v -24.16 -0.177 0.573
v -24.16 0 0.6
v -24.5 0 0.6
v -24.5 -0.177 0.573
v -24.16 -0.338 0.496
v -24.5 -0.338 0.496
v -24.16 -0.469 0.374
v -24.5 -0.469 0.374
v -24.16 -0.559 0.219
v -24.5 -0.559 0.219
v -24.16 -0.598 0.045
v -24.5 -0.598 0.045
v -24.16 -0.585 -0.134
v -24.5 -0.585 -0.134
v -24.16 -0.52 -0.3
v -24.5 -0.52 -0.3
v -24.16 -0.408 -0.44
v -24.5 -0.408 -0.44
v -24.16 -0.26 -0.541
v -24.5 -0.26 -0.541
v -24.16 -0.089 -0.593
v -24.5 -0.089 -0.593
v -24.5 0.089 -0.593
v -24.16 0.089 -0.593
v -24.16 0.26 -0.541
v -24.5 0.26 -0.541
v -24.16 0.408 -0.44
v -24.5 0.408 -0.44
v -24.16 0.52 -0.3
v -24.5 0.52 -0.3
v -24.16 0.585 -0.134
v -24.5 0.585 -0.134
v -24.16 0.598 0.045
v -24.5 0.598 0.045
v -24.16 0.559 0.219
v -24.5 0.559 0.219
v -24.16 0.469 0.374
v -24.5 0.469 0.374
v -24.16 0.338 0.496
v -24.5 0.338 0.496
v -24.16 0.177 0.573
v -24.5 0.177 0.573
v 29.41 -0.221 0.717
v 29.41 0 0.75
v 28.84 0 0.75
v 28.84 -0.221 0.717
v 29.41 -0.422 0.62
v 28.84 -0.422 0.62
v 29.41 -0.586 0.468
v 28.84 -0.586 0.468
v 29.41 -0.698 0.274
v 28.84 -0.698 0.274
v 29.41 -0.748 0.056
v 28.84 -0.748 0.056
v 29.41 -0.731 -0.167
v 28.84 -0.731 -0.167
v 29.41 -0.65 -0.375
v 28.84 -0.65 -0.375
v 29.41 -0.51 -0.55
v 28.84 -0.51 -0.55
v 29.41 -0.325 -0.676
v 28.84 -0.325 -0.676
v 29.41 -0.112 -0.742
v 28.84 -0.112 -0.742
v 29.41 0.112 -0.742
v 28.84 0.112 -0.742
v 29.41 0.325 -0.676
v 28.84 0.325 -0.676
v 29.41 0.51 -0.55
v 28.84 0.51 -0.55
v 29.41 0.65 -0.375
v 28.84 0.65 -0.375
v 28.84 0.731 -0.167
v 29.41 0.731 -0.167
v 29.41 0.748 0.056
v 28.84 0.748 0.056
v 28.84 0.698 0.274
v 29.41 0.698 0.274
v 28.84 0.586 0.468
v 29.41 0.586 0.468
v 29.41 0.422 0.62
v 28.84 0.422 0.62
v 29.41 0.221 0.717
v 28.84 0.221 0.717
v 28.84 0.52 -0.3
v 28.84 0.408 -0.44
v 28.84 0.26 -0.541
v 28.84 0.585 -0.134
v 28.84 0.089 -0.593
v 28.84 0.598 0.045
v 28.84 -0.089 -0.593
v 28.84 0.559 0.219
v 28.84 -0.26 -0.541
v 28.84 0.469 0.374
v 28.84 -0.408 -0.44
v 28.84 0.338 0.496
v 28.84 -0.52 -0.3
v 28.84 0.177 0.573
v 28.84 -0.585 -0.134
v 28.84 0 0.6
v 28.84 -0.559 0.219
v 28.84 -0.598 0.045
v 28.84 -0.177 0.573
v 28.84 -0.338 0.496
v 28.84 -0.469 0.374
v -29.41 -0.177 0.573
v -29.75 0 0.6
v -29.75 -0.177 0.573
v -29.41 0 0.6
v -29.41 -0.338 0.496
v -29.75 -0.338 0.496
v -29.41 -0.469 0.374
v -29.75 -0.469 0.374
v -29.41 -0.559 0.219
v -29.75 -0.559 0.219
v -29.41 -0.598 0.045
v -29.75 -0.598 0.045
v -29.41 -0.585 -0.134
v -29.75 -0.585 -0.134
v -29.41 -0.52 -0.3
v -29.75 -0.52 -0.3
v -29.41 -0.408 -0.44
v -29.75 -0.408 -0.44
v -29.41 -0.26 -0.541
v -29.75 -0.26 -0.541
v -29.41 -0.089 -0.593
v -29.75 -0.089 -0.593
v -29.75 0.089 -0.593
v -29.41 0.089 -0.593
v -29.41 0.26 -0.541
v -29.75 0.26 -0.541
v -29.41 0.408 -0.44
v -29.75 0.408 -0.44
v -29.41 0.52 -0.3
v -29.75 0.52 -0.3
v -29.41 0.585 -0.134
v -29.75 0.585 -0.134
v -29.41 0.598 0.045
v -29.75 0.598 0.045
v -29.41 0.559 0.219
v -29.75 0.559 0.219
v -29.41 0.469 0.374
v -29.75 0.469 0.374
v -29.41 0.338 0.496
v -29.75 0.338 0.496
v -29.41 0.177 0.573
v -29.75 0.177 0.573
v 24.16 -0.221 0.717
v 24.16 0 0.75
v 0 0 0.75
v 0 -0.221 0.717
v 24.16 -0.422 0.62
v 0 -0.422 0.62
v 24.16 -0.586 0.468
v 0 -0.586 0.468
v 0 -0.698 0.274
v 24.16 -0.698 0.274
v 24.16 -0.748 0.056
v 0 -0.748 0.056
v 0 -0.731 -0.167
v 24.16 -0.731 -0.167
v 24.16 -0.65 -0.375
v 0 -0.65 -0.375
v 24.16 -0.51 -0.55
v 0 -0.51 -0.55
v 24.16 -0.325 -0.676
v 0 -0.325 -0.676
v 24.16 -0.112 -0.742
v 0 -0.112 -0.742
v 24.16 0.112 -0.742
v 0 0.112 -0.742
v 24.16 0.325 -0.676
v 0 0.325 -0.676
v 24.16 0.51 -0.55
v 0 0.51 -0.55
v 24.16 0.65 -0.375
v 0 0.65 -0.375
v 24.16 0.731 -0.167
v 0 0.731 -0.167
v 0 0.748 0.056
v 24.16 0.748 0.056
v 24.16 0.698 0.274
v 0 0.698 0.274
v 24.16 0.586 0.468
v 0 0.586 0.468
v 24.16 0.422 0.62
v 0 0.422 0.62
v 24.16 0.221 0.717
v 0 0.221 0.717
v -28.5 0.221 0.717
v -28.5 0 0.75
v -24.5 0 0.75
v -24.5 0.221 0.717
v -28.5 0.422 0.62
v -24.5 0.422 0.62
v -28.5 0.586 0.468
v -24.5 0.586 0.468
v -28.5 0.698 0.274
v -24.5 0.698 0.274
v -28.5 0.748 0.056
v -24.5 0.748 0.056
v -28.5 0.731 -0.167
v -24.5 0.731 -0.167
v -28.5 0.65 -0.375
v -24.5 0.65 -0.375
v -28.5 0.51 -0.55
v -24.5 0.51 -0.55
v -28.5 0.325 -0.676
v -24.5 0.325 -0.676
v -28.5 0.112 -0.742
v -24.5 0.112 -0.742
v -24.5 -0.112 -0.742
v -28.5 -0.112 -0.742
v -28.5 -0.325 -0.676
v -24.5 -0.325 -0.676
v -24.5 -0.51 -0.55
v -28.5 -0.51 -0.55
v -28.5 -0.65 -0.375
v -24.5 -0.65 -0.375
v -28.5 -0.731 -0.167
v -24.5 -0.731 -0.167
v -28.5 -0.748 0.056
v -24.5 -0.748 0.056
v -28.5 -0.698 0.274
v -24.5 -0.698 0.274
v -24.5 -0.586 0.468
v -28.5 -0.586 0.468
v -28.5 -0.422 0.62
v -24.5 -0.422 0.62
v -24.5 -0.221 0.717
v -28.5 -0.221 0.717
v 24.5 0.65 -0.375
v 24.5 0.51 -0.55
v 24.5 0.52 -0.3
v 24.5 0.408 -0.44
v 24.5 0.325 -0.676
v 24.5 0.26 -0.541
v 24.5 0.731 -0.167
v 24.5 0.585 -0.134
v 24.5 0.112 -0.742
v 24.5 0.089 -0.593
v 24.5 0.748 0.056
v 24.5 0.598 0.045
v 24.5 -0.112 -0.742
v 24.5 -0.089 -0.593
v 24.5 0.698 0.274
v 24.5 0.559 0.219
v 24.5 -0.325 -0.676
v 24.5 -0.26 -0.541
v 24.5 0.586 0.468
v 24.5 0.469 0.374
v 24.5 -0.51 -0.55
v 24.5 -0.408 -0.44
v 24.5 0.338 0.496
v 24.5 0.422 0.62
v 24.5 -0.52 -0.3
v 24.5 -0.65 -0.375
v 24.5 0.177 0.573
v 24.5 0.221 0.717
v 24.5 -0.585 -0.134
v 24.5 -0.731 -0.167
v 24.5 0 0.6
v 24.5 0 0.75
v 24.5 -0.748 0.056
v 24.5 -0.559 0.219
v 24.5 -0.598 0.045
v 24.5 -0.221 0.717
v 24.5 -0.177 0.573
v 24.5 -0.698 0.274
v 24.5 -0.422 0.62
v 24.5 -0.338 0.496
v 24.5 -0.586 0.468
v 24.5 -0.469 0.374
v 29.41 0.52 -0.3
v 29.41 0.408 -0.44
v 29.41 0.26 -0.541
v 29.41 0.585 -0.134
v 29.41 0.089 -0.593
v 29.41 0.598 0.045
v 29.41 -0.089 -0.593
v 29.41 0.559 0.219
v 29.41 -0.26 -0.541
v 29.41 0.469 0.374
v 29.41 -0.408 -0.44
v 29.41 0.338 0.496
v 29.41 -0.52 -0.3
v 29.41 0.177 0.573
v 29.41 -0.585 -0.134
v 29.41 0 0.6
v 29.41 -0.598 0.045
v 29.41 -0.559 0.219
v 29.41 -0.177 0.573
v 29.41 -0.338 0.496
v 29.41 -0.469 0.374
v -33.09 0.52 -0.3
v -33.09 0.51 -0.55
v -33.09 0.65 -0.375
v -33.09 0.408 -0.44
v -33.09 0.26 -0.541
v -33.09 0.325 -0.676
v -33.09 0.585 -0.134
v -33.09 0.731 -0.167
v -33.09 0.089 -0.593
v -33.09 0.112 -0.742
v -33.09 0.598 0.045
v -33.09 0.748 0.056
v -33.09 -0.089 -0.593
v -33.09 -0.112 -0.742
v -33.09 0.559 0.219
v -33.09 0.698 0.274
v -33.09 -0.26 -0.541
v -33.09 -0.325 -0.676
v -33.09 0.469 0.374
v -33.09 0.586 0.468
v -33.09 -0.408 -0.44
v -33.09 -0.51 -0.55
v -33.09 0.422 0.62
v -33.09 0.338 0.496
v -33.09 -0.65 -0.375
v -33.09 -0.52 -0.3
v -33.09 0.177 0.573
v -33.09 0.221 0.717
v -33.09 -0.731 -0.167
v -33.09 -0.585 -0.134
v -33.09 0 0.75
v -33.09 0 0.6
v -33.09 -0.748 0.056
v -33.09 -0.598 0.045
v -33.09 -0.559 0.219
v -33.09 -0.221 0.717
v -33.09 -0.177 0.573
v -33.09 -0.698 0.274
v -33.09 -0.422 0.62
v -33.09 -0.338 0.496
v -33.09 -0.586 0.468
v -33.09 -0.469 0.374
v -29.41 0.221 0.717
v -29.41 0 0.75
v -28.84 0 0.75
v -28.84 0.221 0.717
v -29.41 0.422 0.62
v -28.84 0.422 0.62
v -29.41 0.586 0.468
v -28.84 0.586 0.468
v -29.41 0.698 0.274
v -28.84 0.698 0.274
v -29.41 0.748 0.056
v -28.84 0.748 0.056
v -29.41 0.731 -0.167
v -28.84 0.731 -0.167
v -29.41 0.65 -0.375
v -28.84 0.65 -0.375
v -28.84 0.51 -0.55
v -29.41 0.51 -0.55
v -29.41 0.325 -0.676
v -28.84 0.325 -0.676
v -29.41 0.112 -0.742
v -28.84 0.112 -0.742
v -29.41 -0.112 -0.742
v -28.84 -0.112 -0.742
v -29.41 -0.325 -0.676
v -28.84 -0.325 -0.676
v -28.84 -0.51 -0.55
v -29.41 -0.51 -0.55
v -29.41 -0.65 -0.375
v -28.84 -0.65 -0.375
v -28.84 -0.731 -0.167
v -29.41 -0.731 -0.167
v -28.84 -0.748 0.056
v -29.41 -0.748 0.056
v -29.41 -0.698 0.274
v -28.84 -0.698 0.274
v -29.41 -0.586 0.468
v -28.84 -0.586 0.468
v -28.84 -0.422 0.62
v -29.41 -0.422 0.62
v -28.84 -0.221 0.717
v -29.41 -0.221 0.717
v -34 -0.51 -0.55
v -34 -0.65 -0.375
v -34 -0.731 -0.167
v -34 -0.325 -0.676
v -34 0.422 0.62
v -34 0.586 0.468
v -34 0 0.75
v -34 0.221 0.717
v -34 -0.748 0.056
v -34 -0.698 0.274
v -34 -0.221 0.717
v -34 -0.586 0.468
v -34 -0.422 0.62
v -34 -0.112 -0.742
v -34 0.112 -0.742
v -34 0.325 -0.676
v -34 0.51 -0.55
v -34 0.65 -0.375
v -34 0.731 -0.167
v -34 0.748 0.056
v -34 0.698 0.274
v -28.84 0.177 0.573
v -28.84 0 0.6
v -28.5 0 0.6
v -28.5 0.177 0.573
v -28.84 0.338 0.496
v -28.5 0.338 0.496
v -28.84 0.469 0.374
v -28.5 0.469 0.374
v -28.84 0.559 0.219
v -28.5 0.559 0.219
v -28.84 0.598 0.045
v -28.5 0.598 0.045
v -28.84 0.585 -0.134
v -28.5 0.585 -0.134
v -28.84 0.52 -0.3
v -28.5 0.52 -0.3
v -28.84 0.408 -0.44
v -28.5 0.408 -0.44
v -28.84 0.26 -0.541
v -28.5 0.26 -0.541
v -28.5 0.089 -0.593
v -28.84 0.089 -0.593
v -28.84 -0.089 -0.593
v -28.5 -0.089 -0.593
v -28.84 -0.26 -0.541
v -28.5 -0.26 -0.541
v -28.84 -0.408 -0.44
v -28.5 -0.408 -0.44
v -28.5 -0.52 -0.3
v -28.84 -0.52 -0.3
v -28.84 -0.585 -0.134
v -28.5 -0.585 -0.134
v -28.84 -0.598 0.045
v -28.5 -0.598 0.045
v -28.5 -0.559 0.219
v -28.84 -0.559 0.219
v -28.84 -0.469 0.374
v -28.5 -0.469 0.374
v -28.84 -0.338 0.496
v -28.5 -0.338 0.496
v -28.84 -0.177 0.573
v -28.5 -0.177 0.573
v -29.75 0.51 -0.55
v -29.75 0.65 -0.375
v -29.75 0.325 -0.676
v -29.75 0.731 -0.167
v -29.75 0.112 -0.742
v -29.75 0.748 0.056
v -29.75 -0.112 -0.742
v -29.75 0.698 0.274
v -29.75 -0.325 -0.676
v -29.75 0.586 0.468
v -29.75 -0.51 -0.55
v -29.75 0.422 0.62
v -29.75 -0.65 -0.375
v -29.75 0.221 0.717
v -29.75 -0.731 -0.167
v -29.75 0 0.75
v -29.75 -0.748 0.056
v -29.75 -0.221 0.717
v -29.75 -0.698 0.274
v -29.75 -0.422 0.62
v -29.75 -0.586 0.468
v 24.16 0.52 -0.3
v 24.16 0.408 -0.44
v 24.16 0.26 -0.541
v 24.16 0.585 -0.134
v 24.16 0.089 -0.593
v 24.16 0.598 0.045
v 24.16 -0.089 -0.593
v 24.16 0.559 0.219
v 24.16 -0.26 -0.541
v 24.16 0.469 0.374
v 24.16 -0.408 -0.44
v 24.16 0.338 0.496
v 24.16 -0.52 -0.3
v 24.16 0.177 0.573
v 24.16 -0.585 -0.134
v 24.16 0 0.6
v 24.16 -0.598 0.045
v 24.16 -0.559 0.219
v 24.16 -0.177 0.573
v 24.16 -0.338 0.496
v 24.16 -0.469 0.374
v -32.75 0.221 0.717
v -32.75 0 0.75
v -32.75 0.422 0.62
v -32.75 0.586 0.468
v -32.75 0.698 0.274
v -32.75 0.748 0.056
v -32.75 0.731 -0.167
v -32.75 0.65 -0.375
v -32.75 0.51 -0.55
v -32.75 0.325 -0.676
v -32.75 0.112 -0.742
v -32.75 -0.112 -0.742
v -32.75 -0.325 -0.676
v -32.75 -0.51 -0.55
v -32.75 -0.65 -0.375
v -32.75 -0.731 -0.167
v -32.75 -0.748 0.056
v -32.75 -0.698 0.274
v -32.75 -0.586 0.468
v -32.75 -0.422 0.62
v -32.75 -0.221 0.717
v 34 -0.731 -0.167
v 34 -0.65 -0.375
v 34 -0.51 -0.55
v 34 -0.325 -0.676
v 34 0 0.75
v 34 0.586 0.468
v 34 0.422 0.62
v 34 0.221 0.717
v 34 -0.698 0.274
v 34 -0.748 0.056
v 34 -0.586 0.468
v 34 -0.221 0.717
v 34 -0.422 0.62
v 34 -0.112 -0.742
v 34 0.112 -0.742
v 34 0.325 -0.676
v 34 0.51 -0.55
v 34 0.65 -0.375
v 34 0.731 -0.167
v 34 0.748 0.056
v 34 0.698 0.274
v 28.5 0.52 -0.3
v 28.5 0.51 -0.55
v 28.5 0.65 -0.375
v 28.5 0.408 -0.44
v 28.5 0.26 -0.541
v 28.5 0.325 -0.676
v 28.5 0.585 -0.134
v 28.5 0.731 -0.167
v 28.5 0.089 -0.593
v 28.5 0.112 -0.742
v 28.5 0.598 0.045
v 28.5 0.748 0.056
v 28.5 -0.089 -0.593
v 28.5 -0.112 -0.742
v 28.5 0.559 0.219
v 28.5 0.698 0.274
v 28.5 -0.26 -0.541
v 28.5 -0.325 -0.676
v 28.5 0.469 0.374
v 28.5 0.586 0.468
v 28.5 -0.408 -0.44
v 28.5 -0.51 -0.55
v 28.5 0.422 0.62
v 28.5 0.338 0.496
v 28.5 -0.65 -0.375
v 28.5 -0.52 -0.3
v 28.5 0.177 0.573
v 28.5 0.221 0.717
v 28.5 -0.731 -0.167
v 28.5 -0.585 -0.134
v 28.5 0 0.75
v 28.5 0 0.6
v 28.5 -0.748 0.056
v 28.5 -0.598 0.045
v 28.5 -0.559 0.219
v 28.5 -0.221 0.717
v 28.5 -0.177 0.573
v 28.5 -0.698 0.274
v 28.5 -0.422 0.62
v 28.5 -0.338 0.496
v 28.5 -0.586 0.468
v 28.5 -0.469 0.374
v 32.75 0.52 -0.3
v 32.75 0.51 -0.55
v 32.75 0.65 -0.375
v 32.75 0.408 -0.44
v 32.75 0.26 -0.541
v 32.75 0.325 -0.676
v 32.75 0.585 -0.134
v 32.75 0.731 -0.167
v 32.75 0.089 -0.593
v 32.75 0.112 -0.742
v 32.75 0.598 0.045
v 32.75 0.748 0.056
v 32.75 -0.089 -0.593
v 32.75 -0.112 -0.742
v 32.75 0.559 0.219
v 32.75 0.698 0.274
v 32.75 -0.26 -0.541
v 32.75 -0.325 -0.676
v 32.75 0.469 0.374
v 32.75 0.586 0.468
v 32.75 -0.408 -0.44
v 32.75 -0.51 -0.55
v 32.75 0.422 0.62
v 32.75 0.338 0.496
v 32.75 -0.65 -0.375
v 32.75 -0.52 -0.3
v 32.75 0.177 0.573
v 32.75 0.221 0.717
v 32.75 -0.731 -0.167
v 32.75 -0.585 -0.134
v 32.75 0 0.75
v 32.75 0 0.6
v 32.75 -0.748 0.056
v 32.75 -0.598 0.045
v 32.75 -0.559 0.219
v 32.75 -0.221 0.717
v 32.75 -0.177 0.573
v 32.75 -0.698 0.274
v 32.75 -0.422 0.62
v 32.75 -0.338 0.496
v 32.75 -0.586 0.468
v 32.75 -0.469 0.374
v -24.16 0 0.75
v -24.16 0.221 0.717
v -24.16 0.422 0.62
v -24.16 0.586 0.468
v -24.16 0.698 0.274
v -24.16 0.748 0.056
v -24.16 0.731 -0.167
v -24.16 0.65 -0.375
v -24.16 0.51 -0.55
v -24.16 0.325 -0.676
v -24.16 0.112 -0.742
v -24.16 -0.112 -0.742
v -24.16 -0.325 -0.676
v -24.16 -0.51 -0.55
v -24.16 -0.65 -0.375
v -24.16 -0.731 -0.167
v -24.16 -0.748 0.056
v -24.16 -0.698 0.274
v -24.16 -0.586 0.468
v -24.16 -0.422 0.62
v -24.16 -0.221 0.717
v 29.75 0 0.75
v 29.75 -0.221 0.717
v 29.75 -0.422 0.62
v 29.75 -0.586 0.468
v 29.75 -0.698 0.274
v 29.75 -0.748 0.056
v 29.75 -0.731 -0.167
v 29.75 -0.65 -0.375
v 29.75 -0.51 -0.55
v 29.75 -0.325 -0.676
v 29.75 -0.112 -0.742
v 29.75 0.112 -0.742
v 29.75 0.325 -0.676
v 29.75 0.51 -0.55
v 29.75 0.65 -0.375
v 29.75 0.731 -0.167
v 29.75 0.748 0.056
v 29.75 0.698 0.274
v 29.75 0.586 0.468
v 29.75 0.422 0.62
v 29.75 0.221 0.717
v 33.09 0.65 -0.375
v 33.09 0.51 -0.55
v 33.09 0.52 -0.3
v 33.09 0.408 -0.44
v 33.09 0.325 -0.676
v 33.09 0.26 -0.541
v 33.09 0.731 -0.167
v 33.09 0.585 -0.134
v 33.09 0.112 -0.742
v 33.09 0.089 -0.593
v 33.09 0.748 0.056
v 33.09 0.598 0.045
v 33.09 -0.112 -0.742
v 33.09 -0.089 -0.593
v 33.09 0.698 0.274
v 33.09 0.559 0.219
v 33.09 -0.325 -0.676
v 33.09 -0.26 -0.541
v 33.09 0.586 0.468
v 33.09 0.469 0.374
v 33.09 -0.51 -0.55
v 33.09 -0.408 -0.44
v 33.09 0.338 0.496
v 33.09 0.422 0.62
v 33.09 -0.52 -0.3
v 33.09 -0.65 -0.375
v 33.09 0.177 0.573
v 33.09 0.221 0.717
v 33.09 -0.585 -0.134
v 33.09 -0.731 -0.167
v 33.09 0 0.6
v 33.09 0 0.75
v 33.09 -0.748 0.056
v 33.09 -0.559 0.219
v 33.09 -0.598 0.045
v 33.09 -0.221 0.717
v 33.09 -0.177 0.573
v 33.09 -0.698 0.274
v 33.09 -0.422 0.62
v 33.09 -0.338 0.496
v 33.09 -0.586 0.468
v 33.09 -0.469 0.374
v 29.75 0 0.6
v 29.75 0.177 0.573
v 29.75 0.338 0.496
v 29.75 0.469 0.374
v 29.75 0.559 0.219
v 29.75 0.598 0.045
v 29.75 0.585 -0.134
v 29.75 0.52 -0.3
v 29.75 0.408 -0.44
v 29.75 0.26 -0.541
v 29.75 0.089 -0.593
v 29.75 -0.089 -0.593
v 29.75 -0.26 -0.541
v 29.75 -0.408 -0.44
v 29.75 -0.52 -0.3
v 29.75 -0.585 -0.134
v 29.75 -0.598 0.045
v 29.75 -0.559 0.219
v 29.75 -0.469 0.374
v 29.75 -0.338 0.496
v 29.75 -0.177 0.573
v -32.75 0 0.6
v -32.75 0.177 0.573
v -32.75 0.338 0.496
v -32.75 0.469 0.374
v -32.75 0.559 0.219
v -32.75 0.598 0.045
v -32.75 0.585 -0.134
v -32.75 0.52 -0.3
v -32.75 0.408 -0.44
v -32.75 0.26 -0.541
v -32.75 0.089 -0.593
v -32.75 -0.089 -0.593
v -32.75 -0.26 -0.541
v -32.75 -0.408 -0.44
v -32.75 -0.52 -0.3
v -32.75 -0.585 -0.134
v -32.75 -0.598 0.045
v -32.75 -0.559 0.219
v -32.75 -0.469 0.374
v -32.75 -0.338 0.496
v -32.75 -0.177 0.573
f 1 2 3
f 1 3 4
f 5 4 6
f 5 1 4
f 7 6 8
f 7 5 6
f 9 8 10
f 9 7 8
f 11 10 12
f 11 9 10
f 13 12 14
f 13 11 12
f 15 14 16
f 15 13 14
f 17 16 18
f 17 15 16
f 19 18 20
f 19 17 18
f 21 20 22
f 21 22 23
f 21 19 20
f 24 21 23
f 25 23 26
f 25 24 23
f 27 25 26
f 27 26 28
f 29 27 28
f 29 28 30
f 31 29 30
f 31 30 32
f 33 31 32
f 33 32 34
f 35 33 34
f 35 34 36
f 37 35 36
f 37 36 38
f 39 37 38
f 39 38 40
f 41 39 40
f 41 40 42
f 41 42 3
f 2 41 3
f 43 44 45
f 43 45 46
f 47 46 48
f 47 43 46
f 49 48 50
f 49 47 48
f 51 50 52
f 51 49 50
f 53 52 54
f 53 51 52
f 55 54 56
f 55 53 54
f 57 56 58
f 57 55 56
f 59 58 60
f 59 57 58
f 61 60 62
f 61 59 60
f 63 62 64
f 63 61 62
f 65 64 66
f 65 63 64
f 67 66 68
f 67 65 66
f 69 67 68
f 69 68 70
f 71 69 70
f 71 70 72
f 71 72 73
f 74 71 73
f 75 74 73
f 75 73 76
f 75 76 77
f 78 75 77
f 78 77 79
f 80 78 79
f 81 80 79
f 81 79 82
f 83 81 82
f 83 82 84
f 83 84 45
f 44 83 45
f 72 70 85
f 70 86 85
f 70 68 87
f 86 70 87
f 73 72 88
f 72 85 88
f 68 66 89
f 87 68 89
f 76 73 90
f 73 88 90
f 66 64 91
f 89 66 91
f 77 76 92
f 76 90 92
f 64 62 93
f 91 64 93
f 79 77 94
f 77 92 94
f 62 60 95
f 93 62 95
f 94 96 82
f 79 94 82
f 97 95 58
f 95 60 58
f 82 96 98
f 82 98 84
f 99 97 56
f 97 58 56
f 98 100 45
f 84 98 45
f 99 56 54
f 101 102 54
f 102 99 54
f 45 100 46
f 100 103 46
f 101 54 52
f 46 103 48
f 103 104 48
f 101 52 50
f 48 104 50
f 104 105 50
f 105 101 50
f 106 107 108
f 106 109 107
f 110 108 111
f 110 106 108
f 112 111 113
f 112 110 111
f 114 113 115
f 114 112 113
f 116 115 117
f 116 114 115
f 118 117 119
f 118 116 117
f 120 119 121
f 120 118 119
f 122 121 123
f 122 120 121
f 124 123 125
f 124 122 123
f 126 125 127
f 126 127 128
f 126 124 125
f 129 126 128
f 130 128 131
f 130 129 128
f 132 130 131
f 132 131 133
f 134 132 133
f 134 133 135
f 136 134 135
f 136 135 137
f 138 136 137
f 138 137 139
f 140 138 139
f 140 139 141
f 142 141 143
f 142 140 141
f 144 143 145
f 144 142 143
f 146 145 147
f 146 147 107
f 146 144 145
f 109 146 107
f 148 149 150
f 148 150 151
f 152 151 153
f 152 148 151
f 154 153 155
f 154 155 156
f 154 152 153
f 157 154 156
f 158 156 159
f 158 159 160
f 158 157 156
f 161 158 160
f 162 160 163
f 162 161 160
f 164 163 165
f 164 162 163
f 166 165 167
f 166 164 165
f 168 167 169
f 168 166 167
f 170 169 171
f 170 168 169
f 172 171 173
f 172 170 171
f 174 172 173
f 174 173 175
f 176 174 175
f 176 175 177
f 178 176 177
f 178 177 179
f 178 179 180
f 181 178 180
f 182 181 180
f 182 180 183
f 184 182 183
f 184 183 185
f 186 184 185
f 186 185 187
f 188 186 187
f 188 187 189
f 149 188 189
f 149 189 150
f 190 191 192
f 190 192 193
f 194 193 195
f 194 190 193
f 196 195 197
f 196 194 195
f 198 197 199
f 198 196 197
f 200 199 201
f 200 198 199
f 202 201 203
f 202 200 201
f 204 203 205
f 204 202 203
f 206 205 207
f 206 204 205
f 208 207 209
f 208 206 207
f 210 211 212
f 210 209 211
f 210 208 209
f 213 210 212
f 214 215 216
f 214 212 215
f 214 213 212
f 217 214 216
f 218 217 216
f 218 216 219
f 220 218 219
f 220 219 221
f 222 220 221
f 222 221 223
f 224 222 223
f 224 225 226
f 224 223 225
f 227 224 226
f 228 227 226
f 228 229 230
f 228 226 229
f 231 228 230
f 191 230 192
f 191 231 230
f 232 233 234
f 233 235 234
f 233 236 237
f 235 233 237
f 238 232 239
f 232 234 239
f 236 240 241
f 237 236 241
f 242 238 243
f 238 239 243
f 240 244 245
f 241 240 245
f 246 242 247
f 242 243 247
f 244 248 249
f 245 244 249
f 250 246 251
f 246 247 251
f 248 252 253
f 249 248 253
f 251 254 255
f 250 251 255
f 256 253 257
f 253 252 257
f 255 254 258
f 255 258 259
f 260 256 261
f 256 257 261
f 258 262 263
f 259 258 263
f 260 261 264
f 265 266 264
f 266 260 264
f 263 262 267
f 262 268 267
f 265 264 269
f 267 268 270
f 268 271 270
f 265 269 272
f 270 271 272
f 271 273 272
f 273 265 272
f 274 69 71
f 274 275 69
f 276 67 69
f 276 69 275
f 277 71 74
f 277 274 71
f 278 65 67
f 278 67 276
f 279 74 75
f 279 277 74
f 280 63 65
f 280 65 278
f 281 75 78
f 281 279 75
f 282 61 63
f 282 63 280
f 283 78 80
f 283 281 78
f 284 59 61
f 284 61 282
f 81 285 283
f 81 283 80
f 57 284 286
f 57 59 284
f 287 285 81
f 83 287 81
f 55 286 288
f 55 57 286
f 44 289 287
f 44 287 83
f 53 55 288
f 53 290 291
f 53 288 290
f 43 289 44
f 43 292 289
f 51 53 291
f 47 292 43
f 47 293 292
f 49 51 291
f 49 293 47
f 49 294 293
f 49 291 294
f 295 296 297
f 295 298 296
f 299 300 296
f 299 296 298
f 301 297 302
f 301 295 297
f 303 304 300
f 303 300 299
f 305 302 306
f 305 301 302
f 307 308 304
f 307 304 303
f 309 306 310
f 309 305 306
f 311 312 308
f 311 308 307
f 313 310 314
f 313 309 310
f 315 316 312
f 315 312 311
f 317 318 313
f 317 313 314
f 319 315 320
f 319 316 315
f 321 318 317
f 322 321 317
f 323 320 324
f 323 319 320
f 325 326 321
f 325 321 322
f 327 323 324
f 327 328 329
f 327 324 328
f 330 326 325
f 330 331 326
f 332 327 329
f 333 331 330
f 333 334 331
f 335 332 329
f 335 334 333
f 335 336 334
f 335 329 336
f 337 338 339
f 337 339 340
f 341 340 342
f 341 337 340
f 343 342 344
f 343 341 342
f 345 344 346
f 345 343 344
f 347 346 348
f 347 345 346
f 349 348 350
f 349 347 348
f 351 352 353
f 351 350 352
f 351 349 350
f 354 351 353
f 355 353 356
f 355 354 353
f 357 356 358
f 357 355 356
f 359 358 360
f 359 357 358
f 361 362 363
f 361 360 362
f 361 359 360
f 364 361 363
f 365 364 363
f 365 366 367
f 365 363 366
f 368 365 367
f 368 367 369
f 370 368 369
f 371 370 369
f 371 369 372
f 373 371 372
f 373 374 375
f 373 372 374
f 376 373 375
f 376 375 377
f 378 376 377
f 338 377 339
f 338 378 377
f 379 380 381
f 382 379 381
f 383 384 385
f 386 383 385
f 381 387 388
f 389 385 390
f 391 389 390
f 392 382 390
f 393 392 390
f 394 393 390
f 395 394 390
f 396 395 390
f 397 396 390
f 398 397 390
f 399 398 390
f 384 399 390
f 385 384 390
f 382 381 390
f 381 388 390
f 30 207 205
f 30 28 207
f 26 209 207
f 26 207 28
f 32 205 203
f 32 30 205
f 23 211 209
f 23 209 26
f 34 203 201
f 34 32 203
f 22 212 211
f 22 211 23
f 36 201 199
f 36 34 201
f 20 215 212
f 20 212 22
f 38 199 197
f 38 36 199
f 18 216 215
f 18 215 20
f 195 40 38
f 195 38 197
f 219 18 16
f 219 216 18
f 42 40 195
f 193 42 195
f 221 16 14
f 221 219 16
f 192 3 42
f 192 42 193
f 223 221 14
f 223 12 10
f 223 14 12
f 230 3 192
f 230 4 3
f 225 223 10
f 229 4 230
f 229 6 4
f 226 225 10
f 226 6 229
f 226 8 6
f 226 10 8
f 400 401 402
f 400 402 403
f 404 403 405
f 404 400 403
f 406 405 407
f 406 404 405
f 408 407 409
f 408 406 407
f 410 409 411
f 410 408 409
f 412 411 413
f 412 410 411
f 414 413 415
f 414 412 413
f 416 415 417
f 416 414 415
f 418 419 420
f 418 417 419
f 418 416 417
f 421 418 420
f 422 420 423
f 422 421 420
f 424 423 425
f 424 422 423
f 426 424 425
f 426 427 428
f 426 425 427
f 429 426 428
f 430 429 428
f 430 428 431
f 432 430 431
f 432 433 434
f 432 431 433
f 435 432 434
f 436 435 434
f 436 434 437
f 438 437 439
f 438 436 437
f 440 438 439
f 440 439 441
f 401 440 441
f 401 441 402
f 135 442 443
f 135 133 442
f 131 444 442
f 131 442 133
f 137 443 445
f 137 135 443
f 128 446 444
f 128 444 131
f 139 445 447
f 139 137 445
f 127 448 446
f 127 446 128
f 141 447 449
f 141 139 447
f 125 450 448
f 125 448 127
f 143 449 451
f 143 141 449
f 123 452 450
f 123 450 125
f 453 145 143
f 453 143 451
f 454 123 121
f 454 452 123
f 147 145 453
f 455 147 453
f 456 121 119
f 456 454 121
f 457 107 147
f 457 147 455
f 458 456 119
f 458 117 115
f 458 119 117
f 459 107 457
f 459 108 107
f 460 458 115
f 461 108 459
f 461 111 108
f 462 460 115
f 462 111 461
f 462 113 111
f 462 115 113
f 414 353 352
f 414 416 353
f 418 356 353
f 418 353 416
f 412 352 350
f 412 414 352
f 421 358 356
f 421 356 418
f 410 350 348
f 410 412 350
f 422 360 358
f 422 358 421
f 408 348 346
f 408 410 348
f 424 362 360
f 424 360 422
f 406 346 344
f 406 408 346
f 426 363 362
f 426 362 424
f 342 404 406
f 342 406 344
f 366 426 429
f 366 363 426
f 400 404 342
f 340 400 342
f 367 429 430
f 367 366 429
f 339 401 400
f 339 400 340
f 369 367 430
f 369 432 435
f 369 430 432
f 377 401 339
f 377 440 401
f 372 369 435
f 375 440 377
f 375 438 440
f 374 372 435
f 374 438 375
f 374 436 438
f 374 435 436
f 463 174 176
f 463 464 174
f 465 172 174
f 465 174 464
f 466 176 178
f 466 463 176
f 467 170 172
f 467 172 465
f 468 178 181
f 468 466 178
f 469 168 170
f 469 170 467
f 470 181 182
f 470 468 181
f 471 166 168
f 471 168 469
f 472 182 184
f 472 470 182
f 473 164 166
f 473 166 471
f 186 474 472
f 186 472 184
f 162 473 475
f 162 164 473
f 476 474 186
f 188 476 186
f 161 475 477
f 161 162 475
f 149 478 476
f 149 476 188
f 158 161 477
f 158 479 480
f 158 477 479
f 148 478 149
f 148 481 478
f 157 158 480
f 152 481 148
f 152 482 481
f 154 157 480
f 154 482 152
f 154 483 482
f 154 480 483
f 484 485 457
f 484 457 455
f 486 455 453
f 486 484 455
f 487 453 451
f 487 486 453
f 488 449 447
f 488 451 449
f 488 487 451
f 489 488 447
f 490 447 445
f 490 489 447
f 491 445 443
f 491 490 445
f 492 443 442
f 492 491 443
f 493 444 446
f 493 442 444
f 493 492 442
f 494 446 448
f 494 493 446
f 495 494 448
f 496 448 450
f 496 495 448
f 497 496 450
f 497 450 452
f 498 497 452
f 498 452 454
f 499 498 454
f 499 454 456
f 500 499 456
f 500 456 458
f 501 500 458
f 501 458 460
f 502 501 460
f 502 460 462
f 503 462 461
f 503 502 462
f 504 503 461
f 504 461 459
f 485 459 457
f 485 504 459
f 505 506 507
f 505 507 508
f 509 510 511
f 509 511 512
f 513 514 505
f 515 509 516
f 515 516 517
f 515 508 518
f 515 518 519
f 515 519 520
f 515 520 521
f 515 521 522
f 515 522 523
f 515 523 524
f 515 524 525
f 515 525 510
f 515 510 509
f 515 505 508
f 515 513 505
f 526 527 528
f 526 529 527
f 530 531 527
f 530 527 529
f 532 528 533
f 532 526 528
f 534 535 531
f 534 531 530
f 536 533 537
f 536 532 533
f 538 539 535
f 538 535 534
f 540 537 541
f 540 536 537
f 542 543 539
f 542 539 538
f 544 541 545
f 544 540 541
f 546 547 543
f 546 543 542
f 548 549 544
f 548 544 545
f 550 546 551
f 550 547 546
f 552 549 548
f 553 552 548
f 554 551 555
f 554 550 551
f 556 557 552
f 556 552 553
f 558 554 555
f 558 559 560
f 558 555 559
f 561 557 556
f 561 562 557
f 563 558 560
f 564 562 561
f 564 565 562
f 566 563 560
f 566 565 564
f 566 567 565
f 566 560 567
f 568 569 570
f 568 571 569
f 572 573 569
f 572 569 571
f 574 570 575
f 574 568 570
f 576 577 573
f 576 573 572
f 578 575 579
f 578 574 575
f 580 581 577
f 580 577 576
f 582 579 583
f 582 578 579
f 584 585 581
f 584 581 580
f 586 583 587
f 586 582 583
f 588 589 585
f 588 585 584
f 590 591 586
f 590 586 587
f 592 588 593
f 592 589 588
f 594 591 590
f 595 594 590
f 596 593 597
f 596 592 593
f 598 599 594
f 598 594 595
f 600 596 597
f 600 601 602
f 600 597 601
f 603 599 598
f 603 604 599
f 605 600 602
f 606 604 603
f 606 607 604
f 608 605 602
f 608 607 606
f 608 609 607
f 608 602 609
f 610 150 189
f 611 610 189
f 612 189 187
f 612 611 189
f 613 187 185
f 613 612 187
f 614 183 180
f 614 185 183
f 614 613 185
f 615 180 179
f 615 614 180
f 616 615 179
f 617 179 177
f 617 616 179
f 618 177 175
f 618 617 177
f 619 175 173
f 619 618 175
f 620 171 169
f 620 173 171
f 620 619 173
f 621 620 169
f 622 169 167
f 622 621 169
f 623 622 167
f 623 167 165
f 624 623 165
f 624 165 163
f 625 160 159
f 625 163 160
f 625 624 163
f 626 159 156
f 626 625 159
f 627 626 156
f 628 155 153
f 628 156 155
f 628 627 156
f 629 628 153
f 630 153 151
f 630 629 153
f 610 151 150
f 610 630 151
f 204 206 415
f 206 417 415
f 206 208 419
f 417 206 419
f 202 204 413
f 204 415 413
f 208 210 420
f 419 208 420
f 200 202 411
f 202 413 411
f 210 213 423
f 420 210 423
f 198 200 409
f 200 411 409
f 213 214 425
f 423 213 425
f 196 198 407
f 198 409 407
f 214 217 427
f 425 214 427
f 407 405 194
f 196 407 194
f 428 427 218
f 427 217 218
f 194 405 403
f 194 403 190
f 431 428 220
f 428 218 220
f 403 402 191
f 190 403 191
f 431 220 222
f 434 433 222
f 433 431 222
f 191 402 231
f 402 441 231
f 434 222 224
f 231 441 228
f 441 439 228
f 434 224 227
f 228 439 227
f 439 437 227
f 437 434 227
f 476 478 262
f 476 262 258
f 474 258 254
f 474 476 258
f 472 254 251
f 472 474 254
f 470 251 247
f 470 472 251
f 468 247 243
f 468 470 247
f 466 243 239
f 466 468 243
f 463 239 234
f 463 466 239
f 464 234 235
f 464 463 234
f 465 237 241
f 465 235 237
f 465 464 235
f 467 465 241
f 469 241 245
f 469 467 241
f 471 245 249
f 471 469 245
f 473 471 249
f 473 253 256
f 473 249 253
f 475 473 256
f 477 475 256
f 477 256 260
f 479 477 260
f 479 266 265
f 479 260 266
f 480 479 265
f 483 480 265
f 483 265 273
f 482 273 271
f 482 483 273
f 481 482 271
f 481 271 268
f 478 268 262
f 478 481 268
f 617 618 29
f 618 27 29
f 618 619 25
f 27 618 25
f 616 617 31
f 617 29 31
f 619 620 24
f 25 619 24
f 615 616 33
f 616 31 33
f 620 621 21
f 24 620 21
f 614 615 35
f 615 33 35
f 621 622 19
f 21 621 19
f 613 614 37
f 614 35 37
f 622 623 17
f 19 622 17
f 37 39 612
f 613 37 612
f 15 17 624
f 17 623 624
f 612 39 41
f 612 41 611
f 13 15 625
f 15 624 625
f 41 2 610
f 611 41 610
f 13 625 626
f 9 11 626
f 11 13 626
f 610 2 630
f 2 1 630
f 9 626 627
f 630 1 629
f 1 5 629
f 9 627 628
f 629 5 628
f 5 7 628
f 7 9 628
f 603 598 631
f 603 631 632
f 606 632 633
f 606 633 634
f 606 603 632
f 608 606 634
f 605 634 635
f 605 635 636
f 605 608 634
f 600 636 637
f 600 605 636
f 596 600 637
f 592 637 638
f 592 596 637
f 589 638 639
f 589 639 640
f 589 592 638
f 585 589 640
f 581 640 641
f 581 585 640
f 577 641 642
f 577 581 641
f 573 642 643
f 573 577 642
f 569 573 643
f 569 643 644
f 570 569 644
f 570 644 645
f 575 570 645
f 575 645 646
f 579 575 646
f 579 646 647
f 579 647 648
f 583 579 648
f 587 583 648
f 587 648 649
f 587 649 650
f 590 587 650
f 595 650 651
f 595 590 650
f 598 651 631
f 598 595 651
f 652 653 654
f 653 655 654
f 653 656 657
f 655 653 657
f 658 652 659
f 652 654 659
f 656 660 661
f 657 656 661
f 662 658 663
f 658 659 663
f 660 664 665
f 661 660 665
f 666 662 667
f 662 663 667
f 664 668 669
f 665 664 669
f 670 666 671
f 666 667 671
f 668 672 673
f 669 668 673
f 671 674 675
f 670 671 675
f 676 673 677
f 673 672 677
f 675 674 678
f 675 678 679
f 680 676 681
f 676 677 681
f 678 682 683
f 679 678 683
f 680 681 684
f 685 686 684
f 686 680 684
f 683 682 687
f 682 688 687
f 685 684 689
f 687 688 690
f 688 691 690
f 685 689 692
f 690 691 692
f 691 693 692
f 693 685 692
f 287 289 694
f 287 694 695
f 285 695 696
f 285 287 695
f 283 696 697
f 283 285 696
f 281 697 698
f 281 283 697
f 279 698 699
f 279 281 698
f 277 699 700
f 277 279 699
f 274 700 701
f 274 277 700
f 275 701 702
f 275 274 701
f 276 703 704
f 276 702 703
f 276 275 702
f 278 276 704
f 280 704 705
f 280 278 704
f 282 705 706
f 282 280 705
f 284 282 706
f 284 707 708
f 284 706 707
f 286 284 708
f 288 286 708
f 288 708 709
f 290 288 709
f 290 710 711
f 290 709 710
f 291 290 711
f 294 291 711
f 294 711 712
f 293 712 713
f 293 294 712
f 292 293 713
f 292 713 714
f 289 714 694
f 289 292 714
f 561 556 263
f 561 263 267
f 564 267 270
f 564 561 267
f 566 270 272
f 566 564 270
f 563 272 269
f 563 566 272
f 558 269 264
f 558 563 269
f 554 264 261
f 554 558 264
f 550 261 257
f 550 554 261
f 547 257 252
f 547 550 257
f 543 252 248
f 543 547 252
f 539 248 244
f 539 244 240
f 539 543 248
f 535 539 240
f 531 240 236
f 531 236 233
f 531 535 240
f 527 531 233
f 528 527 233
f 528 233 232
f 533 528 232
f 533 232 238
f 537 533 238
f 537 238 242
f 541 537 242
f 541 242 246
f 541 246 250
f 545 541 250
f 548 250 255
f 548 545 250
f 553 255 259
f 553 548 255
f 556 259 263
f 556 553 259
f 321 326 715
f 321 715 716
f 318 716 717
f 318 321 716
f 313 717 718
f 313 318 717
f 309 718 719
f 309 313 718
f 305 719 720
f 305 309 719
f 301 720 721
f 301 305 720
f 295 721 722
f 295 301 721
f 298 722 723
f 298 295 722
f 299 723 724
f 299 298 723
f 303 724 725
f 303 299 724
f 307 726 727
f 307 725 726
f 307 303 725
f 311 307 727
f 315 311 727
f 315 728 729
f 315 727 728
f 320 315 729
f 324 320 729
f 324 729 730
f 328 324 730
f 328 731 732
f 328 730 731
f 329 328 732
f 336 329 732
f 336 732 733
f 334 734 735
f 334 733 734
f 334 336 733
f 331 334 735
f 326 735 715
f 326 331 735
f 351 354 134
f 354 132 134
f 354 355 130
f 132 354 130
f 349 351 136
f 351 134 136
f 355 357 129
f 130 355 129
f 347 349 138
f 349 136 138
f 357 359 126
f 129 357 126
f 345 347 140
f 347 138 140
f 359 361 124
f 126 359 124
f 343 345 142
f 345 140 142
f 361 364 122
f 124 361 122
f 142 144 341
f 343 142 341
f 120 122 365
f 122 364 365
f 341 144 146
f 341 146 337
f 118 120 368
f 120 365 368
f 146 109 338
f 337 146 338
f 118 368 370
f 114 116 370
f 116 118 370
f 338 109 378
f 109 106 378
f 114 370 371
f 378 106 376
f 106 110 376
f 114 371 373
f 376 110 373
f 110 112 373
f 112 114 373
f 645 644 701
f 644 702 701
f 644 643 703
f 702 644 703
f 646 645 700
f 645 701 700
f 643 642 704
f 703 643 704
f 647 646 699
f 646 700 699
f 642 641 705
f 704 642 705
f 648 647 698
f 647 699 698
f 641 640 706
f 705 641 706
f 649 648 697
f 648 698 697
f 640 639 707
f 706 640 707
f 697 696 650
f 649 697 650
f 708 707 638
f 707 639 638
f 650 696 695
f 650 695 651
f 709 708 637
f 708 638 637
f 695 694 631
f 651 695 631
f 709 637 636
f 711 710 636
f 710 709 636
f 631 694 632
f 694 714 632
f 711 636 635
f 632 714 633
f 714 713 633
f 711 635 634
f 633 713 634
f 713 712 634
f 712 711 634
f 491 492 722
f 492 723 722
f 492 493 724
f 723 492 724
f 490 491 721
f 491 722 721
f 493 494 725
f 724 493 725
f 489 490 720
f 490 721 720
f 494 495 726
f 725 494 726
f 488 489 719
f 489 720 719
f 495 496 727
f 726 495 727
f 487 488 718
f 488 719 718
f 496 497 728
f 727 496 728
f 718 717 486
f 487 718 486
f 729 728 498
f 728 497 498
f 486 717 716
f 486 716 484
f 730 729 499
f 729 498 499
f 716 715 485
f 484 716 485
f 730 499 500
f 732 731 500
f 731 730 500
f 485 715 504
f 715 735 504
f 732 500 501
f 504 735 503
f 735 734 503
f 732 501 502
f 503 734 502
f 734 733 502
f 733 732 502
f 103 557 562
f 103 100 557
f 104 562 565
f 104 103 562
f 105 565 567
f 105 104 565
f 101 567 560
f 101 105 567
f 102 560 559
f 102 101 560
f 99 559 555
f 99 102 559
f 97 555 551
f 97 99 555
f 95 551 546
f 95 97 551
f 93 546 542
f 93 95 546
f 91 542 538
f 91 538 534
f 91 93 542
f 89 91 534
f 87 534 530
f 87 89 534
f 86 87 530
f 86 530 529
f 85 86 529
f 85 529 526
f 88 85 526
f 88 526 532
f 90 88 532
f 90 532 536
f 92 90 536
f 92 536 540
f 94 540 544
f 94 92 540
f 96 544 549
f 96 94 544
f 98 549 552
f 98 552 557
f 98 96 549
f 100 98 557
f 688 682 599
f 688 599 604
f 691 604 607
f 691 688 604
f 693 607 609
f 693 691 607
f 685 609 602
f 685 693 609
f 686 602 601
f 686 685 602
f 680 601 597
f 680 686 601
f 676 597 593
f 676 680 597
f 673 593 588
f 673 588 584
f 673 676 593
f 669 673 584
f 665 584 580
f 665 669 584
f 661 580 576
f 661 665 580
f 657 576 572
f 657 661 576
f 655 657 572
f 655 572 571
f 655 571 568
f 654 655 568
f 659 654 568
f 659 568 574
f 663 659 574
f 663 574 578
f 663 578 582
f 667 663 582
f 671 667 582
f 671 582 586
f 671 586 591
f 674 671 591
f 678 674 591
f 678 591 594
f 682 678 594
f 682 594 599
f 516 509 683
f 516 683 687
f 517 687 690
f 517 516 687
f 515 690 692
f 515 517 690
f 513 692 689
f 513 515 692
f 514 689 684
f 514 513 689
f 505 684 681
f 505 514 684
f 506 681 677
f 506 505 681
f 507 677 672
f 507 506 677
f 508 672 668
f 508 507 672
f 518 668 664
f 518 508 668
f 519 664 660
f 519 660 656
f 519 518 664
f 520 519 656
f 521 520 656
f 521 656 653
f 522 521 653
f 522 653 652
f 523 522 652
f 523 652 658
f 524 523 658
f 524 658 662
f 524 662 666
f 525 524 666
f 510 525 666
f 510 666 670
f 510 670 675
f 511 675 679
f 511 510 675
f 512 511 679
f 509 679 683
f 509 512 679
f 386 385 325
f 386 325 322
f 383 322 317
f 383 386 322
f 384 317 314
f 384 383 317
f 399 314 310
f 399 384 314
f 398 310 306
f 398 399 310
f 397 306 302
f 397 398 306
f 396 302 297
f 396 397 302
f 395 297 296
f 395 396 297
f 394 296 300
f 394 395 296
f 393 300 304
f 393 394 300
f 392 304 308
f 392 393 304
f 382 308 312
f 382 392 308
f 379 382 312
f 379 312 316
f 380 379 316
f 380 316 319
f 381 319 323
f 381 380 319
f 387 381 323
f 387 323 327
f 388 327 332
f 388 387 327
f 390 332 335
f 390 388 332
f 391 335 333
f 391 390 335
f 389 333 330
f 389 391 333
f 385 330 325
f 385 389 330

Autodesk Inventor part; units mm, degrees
ref_plane "YZ Plane" through (0, 0, 0) normal (1, 0, 0) x (0, 1, 0)
ref_plane "XZ Plane" through (0, 0, 0) normal (0, 1, 0) x (-1, 0, 0)
ref_plane "XY Plane" through (0, 0, 0) normal (0, 0, 1) x (1, 0, 0)
sketch "Sketch1" plane through (0, 0, 0) normal (0, 1, 0) x (-1, 0, 0)
  line L0 (0, 0) -> (-40, 0) construction
  line L1 (0, 0) -> (0, 0.75)
  line L2 (0, 0.75) -> (-24.16, 0.75)
  line L3 (-24.5, 0.75) -> (-28.5, 0.75)
  line L4 (-28.5, 0.75) -> (-28.84, 0.75) construction
  line L5 (-29.75, 0.75) -> (-32.75, 0.75)
  line L6 (-32.75, 0.75) -> (-33.09, 0.75) construction
  line L7 (-34, 0.75) -> (-34, 0)
  line L8 (-34, 0.75) -> (-33.25, 0.75) construction
  line L9 (-34, 0) -> (0, 0)
  line L10 (-34, 0.6) -> (0, 0.6) construction
  line L11 (-32.75, 0.75) -> (-32.75, 0.6)
  line L12 (-32.75, 0.6) -> (-33.09, 0.6)
  line L13 (-33.09, 0.6) -> (-33.09, 0.75)
  line L14 (-33.09, 0.75) -> (-34, 0.75)
  line L15 (-29.75, 0.75) -> (-29.75, 0.6)
  line L16 (-29.75, 0.6) -> (-29.41, 0.6)
  line L17 (-29.41, 0.6) -> (-29.41, 0.75)
  line L18 (-28.5, 0.75) -> (-28.5, 0.6)
  line L19 (-28.5, 0.6) -> (-28.84, 0.6)
  line L20 (-28.84, 0.6) -> (-28.84, 0.75)
  line L21 (-29.41, 0.75) -> (-29.75, 0.75) construction
  line L22 (-28.84, 0.75) -> (-29.41, 0.75)
  line L23 (-24.5, 0.75) -> (-24.5, 0.6)
  line L24 (-24.5, 0.6) -> (-24.16, 0.6)
  line L25 (-24.16, 0.6) -> (-24.16, 0.75)
  line L26 (-24.16, 0.75) -> (-24.5, 0.75) construction
  line L27 (0, 0) -> (40, 0) construction
  line L28 (0, 0.75) -> (24.16, 0.75)
  line L29 (24.5, 0.75) -> (28.5, 0.75)
  line L30 (28.5, 0.75) -> (28.84, 0.75) construction
  line L31 (29.75, 0.75) -> (32.75, 0.75)
  line L32 (32.75, 0.75) -> (33.09, 0.75) construction
  line L33 (34, 0.75) -> (34, 0)
  line L34 (34, 0.75) -> (33.25, 0.75) construction
  line L35 (34, 0) -> (0, 0)
  line L36 (34, 0.6) -> (0, 0.6) construction
  line L37 (32.75, 0.75) -> (32.75, 0.6)
  line L38 (32.75, 0.6) -> (33.09, 0.6)
  line L39 (33.09, 0.6) -> (33.09, 0.75)
  line L40 (33.09, 0.75) -> (34, 0.75)
  line L41 (29.75, 0.75) -> (29.75, 0.6)
  line L42 (29.75, 0.6) -> (29.41, 0.6)
  line L43 (29.41, 0.6) -> (29.41, 0.75)
  line L44 (28.5, 0.75) -> (28.5, 0.6)
  line L45 (28.5, 0.6) -> (28.84, 0.6)
  line L46 (28.84, 0.6) -> (28.84, 0.75)
  line L47 (29.41, 0.75) -> (29.75, 0.75) construction
  line L48 (28.84, 0.75) -> (29.41, 0.75)
  line L49 (24.5, 0.75) -> (24.5, 0.6)
  line L50 (24.5, 0.6) -> (24.16, 0.6)
  line L51 (24.16, 0.6) -> (24.16, 0.75)
  line L52 (24.16, 0.75) -> (24.5, 0.75) construction
  dimension "d36" = 40
  dimension "d38" = 0.75
  dimension "d39" = 24.5
  dimension "d41" = 4
  dimension "d43" = 1.25
  dimension "d45" = 3
  dimension "d47" = 1.25
  dimension "d50" = 90
  dimension "d51" = 34
  dimension "d52" = 1.2
  dimension "d53" = 0.75
  dimension "d54" = 1.5
  dimension "d55" = 0.34
  dimension "d56" = 0.34
  dimension "d57" = 0.34
  dimension "d58" = 0.34
revolve "Revolution2" add sketch "Sketch1" angle 360 about axis through (-34, 0, 0) along (1, 0, 0)
properties part number "IDLER SHAFT"
